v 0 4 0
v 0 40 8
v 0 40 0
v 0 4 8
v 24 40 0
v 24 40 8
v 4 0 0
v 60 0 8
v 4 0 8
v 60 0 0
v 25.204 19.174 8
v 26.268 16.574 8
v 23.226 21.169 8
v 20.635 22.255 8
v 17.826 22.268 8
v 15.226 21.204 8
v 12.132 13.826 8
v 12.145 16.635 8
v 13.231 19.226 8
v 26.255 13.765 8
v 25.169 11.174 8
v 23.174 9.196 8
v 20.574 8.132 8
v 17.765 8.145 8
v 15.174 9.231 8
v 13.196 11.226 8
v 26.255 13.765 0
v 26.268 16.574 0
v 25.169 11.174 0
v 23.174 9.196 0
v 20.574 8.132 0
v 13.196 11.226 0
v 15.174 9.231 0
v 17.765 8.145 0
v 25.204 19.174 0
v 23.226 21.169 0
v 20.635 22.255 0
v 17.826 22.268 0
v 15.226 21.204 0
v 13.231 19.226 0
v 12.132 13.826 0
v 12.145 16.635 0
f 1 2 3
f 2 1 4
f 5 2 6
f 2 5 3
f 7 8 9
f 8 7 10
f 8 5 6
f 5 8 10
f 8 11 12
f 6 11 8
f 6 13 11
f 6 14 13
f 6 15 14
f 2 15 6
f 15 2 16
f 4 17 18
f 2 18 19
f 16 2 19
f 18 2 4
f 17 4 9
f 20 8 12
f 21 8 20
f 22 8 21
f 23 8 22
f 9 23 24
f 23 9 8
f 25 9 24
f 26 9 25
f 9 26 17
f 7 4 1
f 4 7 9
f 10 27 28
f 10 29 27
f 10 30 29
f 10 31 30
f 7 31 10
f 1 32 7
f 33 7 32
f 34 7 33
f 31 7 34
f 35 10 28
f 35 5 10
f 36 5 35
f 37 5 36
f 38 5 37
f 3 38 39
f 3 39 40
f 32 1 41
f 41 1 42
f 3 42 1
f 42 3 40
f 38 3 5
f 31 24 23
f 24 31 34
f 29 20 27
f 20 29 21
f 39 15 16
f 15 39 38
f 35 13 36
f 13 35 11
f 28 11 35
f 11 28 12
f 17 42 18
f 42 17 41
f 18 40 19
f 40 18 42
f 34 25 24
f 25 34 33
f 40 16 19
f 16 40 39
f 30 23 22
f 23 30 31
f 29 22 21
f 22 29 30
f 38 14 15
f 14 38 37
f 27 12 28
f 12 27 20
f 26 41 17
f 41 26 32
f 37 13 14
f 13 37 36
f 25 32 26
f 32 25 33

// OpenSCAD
$fn = 32;

// ----------------------------------------------------------------------
// Bracket plate: gusset 60 x 40
// ----------------------------------------------------------------------

// --- parameters (mm) ---
hole_r = 4;               // bolt hole radius
plate_t = 8;              // plate thickness, Z (extrusion height)
gus_a = 60;               // base length
gus_b = 40;               // height
top_x = 24;               // top edge X of the angled cut
light_r = 7.2;            // lightening hole radius

light_d = 2 * light_r;

profile = [[4, 0], [30, 0], [60, 0], [24, 40], [0, 40], [0, 4]];  // primary outline, 6 points, counter clockwise
void_1 = [[26.268, 16.574], [25.204, 19.174], [23.226, 21.169], [20.635, 22.255], [17.826, 22.268], [15.226, 21.204], [13.231, 19.226], [12.145, 16.635], [12.132, 13.826], [13.196, 11.226], [15.174, 9.231], [17.765, 8.145], [20.574, 8.132], [23.174, 9.196], [25.169, 11.174], [26.255, 13.765]];  // lightening hole, 16 points

// --- the one profile operation ---
difference() {
  linear_extrude(height = plate_t) polygon(points = profile);
  translate([0, 0, -1])
    linear_extrude(height = plate_t + 2) polygon(points = void_1);
}
